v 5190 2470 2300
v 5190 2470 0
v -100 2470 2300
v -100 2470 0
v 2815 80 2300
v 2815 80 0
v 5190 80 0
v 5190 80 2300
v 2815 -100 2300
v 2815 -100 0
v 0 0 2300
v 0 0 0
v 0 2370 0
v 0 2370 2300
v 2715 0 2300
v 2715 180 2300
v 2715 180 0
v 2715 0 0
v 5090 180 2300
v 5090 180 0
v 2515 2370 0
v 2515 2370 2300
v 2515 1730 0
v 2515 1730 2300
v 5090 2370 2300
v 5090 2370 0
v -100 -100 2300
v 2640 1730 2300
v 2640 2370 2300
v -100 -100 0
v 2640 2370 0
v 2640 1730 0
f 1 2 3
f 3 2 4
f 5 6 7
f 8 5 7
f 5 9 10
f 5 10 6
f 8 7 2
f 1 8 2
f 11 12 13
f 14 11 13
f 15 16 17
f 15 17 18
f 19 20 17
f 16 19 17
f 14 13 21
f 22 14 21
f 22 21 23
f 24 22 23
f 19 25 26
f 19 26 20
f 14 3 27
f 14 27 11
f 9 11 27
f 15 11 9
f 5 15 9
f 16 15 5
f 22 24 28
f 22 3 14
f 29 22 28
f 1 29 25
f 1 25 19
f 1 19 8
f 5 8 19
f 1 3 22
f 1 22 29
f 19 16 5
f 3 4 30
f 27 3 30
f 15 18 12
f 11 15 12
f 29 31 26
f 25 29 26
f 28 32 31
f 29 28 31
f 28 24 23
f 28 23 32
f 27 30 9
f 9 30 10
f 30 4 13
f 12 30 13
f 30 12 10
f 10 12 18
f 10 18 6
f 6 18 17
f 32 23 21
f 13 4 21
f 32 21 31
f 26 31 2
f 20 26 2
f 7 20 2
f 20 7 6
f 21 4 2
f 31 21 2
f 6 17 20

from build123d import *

# Parameters (mm, degrees)
F1_DEPTH = 2300


with BuildPart() as f1:
    # F0 (on Top) → F1 (new body)
    with BuildSketch(Plane.XY):
        Polygon((2815, -100.000001), (2815, 79.999999), (5190.000001, 79.999999), (5190.000001, 2470.000001), (2610.000001, 2470.000001), (-100.000001, 2470.000001), (-100.000001, -100.000001), (2515, -100.000001), align=None)
        Polygon((2715, 0), (0, 0), (0, 2370), (2515, 2370), (2515, 1730), (2640, 1730), (2640, 2370), (5090, 2370), (5090, 180), (2715, 180), align=None, mode=Mode.SUBTRACT)
    extrude(amount=F1_DEPTH)


solid = f1.part
